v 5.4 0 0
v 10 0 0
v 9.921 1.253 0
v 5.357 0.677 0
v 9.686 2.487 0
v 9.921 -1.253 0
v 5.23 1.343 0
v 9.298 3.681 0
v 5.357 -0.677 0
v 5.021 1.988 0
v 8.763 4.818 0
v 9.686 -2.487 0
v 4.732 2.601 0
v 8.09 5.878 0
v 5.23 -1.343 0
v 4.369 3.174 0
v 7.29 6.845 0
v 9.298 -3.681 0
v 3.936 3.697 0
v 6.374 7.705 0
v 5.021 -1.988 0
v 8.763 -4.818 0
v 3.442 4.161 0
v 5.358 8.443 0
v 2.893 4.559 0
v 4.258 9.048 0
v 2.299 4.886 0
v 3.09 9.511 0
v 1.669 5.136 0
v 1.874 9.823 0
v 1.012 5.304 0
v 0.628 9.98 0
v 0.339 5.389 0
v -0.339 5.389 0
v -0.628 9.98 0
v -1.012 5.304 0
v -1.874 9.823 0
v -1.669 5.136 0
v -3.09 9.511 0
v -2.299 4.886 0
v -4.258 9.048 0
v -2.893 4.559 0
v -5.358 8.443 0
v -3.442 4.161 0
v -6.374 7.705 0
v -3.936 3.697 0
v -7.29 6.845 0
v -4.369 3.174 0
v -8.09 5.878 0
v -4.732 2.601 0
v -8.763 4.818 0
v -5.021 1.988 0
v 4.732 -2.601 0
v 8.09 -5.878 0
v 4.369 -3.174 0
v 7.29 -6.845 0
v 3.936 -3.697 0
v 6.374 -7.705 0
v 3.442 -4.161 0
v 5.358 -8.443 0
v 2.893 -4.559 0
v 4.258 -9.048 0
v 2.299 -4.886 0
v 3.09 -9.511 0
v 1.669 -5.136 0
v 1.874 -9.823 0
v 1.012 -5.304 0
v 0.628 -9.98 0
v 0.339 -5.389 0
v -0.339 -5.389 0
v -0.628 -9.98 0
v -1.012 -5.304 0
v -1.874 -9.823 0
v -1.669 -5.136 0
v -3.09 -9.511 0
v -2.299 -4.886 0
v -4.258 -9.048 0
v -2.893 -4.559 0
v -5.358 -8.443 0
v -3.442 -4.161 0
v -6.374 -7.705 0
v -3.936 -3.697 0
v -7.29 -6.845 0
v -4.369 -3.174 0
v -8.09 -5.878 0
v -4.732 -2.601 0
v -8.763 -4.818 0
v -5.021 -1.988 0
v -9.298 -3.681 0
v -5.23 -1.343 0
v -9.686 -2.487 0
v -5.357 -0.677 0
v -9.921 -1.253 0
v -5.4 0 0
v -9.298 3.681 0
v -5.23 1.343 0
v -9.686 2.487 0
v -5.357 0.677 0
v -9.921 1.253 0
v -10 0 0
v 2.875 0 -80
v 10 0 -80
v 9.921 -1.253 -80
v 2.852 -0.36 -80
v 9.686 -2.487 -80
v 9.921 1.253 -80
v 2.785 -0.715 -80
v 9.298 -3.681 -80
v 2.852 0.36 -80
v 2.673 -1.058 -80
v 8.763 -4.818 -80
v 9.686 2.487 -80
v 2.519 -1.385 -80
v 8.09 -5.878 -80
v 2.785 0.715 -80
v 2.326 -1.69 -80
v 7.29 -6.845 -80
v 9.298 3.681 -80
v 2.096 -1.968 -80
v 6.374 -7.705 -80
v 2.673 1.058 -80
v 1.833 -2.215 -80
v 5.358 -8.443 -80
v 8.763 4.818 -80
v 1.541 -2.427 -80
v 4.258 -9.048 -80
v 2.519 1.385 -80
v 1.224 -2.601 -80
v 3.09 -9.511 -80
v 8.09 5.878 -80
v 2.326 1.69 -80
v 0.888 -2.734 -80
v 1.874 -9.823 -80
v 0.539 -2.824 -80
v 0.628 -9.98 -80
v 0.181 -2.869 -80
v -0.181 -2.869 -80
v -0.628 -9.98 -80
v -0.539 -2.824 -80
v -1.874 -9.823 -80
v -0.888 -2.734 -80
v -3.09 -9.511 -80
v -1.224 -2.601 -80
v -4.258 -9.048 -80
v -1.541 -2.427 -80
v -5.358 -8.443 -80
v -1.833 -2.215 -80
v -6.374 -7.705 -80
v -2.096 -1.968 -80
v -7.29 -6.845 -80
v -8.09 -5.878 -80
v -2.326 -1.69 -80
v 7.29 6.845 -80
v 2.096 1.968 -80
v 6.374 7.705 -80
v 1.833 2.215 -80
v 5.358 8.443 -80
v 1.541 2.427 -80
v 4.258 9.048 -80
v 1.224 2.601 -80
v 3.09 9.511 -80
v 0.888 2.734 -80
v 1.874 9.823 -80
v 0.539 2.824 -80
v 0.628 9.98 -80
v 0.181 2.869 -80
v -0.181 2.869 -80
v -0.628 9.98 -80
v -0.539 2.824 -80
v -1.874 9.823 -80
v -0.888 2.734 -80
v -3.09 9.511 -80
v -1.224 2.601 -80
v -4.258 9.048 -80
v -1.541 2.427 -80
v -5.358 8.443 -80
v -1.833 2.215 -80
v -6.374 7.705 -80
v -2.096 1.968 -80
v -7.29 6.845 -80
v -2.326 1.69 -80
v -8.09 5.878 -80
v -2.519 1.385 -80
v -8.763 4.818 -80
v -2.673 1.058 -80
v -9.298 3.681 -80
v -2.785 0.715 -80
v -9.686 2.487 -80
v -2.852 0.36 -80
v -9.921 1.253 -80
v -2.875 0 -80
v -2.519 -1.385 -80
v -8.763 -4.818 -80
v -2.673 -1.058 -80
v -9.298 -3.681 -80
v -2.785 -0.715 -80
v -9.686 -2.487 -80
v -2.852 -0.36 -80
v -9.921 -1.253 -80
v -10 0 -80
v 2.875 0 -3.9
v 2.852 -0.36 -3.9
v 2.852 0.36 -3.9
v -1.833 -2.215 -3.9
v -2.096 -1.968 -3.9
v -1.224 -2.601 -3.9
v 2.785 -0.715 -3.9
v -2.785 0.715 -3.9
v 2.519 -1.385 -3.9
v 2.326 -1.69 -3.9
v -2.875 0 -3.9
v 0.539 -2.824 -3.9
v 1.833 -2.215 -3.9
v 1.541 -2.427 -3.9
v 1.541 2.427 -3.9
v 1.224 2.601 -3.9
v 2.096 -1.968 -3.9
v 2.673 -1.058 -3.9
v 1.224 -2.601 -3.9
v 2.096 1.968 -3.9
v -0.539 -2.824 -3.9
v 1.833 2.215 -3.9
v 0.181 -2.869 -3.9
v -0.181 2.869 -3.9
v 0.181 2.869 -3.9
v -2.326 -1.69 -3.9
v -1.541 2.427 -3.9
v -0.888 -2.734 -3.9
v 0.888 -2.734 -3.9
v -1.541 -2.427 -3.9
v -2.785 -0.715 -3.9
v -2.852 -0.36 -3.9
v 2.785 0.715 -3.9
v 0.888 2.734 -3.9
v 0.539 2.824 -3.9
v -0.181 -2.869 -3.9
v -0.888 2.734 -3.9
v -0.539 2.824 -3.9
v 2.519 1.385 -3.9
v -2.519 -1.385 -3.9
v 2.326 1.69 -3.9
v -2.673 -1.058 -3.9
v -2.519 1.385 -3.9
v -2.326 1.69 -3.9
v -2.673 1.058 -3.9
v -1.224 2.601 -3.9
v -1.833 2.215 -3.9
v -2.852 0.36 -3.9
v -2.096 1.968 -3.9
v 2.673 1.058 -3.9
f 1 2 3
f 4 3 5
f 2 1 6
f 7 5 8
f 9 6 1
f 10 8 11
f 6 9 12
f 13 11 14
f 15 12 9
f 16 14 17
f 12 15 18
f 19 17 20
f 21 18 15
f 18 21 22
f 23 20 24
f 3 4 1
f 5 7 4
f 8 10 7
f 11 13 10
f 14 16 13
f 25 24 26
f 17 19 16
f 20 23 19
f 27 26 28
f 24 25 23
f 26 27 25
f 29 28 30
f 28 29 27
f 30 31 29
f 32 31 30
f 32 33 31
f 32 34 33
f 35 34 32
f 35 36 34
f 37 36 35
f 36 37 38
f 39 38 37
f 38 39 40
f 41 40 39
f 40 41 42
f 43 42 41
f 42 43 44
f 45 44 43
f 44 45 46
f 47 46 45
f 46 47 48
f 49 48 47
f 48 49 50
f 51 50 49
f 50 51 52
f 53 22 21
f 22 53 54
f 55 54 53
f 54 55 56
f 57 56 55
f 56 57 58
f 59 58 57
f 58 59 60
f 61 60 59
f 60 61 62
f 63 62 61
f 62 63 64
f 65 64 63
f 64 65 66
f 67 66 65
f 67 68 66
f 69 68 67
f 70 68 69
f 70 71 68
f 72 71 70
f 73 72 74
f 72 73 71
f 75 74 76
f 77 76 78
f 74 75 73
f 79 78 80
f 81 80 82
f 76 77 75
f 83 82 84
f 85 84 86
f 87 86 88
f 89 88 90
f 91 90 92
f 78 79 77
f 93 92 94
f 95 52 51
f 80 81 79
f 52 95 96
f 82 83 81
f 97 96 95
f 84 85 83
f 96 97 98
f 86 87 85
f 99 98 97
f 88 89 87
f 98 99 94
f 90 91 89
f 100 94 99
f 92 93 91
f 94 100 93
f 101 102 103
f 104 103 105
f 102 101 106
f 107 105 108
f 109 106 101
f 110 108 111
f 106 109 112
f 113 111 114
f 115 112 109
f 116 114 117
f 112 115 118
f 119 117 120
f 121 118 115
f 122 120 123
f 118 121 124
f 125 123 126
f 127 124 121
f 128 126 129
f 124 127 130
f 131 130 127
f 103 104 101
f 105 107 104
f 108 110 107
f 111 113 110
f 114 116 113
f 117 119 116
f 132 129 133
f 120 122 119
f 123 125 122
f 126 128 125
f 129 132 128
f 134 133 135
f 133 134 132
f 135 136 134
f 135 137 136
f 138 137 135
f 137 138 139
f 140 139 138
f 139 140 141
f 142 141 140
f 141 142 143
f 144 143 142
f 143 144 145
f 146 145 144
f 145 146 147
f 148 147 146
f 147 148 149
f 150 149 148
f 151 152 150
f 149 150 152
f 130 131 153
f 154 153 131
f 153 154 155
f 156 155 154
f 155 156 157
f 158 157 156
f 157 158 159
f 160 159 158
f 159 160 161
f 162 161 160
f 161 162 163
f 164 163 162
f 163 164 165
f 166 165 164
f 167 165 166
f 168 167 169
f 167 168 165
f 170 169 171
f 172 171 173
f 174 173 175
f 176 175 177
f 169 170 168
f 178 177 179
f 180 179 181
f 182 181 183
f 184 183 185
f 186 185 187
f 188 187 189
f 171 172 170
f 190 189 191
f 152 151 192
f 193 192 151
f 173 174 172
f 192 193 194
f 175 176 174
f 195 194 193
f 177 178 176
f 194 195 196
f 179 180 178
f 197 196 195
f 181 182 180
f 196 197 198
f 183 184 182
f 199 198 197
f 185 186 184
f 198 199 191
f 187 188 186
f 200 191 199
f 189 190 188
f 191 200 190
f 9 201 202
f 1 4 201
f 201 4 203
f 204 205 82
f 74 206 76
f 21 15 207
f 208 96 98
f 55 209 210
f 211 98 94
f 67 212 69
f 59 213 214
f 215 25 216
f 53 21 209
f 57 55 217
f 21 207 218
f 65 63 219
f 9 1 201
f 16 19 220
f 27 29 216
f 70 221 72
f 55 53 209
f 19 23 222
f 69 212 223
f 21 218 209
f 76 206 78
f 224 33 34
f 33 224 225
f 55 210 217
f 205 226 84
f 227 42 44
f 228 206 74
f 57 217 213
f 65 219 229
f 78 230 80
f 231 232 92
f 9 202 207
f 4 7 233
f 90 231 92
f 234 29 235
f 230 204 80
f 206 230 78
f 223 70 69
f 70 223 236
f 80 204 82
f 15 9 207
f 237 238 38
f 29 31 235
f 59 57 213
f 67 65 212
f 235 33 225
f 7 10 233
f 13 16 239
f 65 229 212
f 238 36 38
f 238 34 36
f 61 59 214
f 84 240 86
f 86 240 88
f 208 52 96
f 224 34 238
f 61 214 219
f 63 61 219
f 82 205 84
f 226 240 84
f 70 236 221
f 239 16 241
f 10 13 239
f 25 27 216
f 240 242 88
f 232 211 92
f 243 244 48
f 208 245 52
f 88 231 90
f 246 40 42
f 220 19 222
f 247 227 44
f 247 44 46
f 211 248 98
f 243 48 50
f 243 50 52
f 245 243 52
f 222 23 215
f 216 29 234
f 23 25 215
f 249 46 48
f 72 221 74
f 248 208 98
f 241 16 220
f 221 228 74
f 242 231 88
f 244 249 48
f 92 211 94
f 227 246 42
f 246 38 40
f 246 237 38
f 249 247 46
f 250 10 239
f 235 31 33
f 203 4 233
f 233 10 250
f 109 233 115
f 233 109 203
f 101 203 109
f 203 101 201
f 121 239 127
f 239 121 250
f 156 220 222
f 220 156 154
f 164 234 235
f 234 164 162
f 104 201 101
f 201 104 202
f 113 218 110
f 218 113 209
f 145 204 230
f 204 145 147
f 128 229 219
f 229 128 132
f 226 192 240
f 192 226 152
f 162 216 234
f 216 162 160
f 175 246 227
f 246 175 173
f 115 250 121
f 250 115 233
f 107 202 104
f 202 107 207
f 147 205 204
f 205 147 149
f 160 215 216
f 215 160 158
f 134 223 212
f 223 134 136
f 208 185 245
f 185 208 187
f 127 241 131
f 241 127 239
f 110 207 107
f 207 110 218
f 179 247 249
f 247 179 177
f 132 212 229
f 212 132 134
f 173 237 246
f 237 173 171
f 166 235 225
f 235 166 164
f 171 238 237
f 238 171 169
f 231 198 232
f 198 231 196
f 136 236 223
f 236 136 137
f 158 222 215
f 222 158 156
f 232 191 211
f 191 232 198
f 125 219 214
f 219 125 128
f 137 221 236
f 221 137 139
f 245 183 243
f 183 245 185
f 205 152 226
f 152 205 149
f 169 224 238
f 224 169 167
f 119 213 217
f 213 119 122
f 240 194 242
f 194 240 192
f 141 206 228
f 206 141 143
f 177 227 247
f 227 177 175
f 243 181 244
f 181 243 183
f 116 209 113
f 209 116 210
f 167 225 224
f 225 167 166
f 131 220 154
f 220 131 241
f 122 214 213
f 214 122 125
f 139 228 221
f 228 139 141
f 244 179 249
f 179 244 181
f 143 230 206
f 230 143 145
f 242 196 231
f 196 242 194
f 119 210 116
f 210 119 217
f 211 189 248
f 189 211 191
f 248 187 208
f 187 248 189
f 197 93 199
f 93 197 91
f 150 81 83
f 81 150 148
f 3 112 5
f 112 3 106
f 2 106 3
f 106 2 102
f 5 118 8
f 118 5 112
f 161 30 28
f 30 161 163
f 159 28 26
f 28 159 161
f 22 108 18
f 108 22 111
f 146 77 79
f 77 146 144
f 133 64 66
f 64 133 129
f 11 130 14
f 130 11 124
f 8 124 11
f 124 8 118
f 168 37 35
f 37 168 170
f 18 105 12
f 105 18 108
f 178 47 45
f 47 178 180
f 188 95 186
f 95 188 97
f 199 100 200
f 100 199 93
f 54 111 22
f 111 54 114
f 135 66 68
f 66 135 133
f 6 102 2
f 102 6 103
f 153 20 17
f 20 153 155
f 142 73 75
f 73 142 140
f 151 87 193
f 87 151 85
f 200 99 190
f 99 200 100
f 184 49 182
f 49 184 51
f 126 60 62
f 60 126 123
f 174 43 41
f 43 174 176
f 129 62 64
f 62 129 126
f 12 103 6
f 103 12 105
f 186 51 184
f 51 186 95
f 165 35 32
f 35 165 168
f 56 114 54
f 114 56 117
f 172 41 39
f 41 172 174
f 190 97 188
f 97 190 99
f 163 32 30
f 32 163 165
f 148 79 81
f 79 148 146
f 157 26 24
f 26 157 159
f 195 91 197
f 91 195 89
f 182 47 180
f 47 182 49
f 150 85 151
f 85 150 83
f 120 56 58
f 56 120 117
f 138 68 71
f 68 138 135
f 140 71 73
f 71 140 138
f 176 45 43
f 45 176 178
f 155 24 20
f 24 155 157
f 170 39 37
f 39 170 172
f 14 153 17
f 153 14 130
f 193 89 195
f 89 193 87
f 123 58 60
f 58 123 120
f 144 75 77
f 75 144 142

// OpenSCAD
$fn = 50;


difference() {
	union() {
		translate(v = [0, 0, -80.0000000000]) {
			cylinder(h = 80, r = 10.0000000000);
		}
	}
	union() {
		translate(v = [0, 0, 0]) {
			rotate(a = [0, 0, 0]) {
				difference() {
					union() {
						#translate(v = [0, 0, -80.0000000000]) {
							cylinder(h = 80, r = 2.6000000000);
						}
						#translate(v = [0, 0, -3.9000000000]) {
							cylinder(h = 3.9000000000, r = 10.0000000000, r1 = 2.8750000000, r2 = 5.4000000000);
						}
						#translate(v = [0, 0, -80.0000000000]) {
							cylinder(h = 80, r = 2.8750000000);
						}
						#translate(v = [0, 0, -80.0000000000]) {
							cylinder(h = 80, r = 2.6000000000);
						}
					}
					union();
				}
			}
		}
	}
}
